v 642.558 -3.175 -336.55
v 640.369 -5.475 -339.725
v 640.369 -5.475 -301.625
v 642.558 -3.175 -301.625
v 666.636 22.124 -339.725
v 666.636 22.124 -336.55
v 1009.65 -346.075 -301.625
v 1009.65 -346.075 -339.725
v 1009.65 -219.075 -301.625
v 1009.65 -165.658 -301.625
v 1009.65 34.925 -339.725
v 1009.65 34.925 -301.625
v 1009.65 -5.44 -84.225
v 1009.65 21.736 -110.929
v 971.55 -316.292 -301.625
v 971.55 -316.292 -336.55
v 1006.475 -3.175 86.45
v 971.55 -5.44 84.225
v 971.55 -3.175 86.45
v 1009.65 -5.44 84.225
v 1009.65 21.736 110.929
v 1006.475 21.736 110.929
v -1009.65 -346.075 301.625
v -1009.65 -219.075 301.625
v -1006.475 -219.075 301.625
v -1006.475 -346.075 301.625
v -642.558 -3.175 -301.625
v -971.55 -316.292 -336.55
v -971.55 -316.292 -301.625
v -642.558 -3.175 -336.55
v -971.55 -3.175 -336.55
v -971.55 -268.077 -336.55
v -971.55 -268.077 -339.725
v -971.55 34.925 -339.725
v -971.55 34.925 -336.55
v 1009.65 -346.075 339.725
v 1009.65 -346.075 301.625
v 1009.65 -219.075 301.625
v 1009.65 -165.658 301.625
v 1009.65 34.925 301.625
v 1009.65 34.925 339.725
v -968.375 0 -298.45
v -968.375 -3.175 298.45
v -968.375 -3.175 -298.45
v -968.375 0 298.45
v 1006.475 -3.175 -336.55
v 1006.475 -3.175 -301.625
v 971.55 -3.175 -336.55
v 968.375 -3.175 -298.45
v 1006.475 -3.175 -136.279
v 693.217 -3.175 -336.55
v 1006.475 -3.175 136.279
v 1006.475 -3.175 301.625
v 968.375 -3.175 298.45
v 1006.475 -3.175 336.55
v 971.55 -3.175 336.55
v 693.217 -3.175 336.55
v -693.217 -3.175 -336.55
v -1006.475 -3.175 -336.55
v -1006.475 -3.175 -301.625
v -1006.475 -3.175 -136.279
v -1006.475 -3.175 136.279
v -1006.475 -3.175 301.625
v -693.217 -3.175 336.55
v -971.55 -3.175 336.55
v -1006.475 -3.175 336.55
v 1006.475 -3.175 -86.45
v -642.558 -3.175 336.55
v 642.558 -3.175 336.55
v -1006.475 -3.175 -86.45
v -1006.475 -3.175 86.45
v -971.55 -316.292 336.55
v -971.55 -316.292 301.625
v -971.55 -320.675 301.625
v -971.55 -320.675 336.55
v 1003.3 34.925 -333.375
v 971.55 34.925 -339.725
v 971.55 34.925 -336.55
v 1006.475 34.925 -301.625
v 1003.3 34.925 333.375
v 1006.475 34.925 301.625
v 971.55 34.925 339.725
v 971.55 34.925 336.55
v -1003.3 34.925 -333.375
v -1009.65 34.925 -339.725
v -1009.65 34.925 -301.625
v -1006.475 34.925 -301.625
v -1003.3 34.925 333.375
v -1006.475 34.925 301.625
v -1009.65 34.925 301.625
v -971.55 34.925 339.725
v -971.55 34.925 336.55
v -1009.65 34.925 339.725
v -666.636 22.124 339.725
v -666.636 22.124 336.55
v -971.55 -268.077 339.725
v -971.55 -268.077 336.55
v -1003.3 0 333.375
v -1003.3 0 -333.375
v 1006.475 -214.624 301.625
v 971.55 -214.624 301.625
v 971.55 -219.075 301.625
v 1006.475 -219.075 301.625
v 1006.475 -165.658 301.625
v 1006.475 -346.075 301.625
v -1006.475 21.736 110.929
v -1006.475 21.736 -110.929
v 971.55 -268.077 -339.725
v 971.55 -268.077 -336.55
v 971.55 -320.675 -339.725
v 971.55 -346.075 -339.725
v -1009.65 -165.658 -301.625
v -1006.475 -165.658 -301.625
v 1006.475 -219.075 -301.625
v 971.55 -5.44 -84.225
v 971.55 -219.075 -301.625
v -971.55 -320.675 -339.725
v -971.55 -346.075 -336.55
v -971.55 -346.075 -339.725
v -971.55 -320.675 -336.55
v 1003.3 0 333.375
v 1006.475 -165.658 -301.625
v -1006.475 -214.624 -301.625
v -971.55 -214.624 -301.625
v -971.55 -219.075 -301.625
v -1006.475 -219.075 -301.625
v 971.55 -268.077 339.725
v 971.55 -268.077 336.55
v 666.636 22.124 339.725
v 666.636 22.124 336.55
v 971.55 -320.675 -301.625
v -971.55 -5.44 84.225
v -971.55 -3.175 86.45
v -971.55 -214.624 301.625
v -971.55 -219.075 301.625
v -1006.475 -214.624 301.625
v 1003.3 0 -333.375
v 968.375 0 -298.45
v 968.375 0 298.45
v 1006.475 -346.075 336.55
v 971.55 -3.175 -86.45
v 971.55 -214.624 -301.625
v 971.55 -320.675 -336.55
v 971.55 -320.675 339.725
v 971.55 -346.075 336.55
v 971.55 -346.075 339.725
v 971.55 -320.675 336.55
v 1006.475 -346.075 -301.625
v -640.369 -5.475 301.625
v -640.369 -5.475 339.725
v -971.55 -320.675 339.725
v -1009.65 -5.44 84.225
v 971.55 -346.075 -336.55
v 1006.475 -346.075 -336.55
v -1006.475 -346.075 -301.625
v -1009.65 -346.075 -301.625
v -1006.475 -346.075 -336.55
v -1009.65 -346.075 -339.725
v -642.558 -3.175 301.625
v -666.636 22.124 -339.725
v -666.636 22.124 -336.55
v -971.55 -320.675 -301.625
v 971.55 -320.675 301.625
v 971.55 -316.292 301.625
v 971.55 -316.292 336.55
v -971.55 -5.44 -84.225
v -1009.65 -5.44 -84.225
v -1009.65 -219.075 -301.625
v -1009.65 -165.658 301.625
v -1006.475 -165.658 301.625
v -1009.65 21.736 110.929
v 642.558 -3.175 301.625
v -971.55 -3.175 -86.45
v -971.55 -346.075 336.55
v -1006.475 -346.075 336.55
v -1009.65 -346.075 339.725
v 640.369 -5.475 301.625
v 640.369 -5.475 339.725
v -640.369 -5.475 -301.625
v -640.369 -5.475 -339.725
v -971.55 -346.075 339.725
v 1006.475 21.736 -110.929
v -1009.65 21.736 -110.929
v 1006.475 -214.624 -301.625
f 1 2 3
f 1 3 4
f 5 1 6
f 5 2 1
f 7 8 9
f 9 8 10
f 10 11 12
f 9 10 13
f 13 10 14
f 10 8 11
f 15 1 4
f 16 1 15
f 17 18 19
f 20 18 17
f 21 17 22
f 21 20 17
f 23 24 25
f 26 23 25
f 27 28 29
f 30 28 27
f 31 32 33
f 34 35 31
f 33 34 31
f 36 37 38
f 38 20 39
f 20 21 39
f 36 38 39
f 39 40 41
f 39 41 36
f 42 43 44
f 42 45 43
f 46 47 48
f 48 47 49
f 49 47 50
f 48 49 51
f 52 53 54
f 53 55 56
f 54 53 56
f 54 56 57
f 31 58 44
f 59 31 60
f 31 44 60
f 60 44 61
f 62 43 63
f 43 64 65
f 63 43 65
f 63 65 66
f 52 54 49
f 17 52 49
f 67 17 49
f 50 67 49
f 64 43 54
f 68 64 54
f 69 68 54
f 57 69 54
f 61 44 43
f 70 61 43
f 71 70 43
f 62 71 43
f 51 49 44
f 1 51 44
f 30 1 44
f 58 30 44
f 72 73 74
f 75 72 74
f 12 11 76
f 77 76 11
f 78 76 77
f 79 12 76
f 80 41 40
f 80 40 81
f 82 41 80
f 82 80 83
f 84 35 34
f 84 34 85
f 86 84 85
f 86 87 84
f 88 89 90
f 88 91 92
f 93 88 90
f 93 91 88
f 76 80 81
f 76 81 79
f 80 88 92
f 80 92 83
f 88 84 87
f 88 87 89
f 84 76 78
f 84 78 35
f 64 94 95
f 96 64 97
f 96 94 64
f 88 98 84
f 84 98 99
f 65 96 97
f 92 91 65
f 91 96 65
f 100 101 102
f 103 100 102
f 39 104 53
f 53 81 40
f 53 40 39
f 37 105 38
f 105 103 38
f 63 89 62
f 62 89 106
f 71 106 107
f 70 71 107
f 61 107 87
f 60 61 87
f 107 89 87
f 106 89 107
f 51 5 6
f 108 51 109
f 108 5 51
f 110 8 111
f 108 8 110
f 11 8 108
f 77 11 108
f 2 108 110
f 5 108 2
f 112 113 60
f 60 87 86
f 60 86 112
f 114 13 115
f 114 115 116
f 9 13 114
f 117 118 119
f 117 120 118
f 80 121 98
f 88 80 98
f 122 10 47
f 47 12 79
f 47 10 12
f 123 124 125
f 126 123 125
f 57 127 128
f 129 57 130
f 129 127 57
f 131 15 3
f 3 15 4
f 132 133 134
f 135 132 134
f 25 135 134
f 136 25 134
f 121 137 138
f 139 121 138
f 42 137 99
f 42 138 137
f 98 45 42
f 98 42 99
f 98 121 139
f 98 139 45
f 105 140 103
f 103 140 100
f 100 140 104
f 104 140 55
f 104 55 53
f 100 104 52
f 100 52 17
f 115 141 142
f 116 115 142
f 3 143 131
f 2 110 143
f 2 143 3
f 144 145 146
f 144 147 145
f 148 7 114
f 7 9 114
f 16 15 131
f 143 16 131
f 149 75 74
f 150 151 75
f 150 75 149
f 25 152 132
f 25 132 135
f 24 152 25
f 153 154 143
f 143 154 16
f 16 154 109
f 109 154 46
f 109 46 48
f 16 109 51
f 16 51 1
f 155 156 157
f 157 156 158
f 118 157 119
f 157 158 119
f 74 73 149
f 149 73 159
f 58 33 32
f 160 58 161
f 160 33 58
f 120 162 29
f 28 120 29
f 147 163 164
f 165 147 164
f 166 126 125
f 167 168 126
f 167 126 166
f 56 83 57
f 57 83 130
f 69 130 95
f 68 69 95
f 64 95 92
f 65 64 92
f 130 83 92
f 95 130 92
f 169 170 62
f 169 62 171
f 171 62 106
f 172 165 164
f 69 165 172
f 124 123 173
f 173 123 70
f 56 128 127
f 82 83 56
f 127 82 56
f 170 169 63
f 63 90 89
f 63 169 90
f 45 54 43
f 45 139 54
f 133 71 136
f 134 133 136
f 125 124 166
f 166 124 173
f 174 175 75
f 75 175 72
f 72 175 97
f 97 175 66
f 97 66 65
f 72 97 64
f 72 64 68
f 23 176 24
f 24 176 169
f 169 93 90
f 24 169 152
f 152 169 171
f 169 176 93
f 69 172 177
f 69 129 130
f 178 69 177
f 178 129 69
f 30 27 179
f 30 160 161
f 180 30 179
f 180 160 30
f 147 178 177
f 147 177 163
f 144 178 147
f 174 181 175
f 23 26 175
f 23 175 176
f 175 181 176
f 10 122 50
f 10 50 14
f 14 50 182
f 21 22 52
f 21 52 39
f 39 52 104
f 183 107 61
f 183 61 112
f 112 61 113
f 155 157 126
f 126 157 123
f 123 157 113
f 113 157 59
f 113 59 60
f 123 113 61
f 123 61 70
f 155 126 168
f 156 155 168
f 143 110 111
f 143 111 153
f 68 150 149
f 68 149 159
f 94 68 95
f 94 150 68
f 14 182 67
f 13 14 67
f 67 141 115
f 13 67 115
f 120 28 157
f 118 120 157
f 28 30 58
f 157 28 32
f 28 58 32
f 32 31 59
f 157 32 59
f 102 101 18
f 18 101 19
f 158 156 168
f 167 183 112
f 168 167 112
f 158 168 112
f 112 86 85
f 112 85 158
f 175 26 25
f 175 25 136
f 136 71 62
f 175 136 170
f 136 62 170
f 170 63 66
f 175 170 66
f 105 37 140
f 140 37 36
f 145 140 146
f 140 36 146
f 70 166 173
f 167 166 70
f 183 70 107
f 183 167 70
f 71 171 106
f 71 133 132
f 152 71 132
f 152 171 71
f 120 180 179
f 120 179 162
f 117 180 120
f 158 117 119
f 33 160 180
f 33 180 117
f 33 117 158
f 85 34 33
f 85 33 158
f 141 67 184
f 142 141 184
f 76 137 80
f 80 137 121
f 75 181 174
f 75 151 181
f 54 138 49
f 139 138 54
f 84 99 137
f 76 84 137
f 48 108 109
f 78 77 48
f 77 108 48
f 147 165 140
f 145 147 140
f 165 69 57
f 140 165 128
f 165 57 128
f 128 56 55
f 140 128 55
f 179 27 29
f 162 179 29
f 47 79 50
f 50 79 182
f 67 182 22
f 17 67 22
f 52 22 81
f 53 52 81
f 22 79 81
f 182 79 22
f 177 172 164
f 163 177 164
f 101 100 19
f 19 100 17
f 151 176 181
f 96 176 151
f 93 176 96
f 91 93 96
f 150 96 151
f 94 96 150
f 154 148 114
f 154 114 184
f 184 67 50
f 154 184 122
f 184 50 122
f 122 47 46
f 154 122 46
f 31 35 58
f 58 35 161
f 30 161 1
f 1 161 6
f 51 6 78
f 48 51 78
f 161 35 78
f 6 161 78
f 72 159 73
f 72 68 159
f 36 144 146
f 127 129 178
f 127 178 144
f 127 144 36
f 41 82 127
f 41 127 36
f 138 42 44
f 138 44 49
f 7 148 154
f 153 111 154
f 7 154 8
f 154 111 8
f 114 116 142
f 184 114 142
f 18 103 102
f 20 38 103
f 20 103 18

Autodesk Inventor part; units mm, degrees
ref_plane "YZ Plane" through (0, 0, 0) normal (1, 0, 0) x (0, 1, 0)
ref_plane "XZ Plane" through (0, 0, 0) normal (0, 1, 0) x (-1, 0, 0)
ref_plane "XY Plane" through (0, 0, 0) normal (0, 0, 1) x (1, 0, 0)
sketch "Sketch1" plane through (0, 0, 0) normal (0, 1, 0) x (-1, 0, 0)
  line L0 (0, -471.17) -> (0, 471.17) projected
  line L1 (1409.065, 0) -> (-1409.065, 0) projected
  line L2 (-1003.3, 333.375) -> (1003.3, 333.375)
  line L3 (1003.3, 333.375) -> (1003.3, -333.375)
  line L4 (1003.3, -333.375) -> (-1003.3, -333.375)
  line L5 (-1003.3, -333.375) -> (-1003.3, 333.375)
  line L6 (-968.375, 298.45) -> (968.375, 298.45)
  line L7 (968.375, 298.45) -> (968.375, -298.45)
  line L8 (968.375, -298.45) -> (-968.375, -298.45)
  line L9 (-968.375, -298.45) -> (-968.375, 298.45)
  line L10 (-1006.475, 336.55) -> (1006.475, 336.55)
  line L11 (1006.475, 336.55) -> (1006.475, -336.55)
  line L12 (1006.475, -336.55) -> (-1006.475, -336.55)
  line L13 (-1006.475, -336.55) -> (-1006.475, 336.55)
  point P0 (0, 0)
  dimension "d0" = 2006.6
  dimension "d1" = 666.75
  dimension "d2" = 596.9
  dimension "d3" = 1936.75
  dimension "d4" = 3.175
  dimension "d5" = 3.175
extrude "Extrusion1" add sketch "Sketch1" against normal blind 3.175 contours L12 L13 L1 L5 L4 L0 | L0 L4 L3 L1 L11 L12 | L4 L5 L1 L9 L8 L0 | L0 L8 L7 L1 L3 L4 | L1 L3 L2 L0 L10 L11 | L13 L10 L0 L2 L5 L1 | L1 L7 L6 L0 L2 L3 | L5 L2 L0 L6 L9 L1
extrude "Extrusion2" add sketch "Sketch1" along normal blind 34.925 contours L12 L13 L1 L5 L4 L0 | L0 L4 L3 L1 L11 L12 | L1 L3 L2 L0 L10 L11 | L13 L10 L0 L2 L5 L1
sketch "Sketch2" plane through (0, 34.925, 0) normal (0, 1, 0) x (1, 0, 0)
  line L0 (1006.475, -336.55) -> (1006.475, 336.55) projected
  line L1 (1006.475, 336.55) -> (-1006.475, 336.55) projected
  line L2 (971.55, 336.55) -> (1006.475, 336.55)
  line L3 (1006.475, 339.725) -> (971.55, 339.725)
  line L4 (971.55, 339.725) -> (971.55, 336.55)
  line L5 (1006.475, 339.725) -> (1009.65, 339.725)
  line L6 (1009.65, 339.725) -> (1009.65, 301.625)
  line L7 (1009.65, 301.625) -> (1006.475, 301.625)
  line L8 (1006.475, 301.625) -> (1006.475, 336.55)
  point P0 (0, 0)
  dimension "d10" = 3.175
  dimension "d15" = 3.175
  dimension "d41" = 38.1
  dimension "d42" = 38.1
extrude "Extrusion3" add sketch "Sketch2" against normal blind 381
sketch "Sketch4" plane through (1006.475, -3.175, 336.55) normal (1, 0, 0) x (0, 0, -1)
  line L0 (638.175, 0) -> (0, 0) projected
  line L1 (447.479, 24.9105) -> (420.7746, -2.2646)
  line L2 (420.7746, -2.2646) -> (638.175, -215.9)
  line L3 (638.175, -215.9) -> (638.175, -162.483)
  line L4 (638.175, -162.483) -> (447.479, 24.9105)
  line L5 (638.175, 38.1) -> (638.175, -342.9) projected
  line L6 (676.275, -342.9) -> (638.175, -342.9) projected
  line L7 (422.9999, 0) -> (638.175, -211.4486)
  line L8 (422.9999, 0) -> (420.7746, -2.2646)
  line L9 (420.7746, -2.2646) -> (638.175, -215.9)
  line L10 (638.175, -215.9) -> (638.175, -211.4486)
  line L11 (638.175, -211.4486) -> (422.9999, 0)
  point P0 (336.55, 3.175)
  dimension "d23" = 38.1
  dimension "d24" = 304.8
  dimension "d25" = 127
  dimension "d28" = 3.175
extrude "Extrusion5" add sketch "Sketch4" against normal blind 34.925 contours L7 L3 L2 L1
extrude "Extrusion6" add sketch "Sketch4" along normal blind 3.175 contours L4 L3 L7 L0 | L0 L1 L4 | L7 L3 L2 L1
sketch "Sketch5" plane through (1009.65, 34.925, -339.725) normal (0, 0, -1) x (-1, 0, 0)
  line L0 (38.1, -381) -> (0, -381) projected
  line L1 (38.1, 0) -> (38.1, -381) projected
  line L2 (38.1, 0) -> (38.1, -38.1) projected
  line L3 (2016.125, -38.1) -> (38.1, -38.1) projected
  line L4 (2016.125, 0) -> (2016.125, -38.1) projected
  line L5 (38.1, 0) -> (2016.125, 0) projected
  line L6 (38.1, -355.6) -> (369.2808, -40.3999)
  line L7 (369.2808, -40.3999) -> (343.0141, -12.8015)
  line L8 (343.0141, -12.8015) -> (38.1, -303.0024)
  line L9 (38.1, -303.0024) -> (38.1, -355.6)
  line L10 (367.0919, -38.1) -> (38.1, -351.2169)
  point P0 (1009.65, -34.925)
  dimension "d33" = 38.1
  dimension "d34" = 25.4
  dimension "d35" = 3.175
  dimension "d36" = 457.2
extrude "Extrusion7" add sketch "Sketch5" against normal blind 3.175 contours L8 L3 L10 L1 | L8 L7 L3 | L10 L7 L6 L1
extrude "Extrusion8" add sketch "Sketch5" against normal blind 38.1 contours L10 L7 L6 L1
mirror "Mirror1" about plane through (0, 0, 0) normal (0, 0, 1) of "Extrusion8", "Extrusion7", "Extrusion6", "Extrusion5", "Extrusion3"
mirror "Mirror2" about plane through (0, 0, 0) normal (1, 0, 0) of "Extrusion8", "Extrusion7", "Extrusion6", "Extrusion5", "Extrusion3", "Mirror1"
properties part number "Burner_Stand"
